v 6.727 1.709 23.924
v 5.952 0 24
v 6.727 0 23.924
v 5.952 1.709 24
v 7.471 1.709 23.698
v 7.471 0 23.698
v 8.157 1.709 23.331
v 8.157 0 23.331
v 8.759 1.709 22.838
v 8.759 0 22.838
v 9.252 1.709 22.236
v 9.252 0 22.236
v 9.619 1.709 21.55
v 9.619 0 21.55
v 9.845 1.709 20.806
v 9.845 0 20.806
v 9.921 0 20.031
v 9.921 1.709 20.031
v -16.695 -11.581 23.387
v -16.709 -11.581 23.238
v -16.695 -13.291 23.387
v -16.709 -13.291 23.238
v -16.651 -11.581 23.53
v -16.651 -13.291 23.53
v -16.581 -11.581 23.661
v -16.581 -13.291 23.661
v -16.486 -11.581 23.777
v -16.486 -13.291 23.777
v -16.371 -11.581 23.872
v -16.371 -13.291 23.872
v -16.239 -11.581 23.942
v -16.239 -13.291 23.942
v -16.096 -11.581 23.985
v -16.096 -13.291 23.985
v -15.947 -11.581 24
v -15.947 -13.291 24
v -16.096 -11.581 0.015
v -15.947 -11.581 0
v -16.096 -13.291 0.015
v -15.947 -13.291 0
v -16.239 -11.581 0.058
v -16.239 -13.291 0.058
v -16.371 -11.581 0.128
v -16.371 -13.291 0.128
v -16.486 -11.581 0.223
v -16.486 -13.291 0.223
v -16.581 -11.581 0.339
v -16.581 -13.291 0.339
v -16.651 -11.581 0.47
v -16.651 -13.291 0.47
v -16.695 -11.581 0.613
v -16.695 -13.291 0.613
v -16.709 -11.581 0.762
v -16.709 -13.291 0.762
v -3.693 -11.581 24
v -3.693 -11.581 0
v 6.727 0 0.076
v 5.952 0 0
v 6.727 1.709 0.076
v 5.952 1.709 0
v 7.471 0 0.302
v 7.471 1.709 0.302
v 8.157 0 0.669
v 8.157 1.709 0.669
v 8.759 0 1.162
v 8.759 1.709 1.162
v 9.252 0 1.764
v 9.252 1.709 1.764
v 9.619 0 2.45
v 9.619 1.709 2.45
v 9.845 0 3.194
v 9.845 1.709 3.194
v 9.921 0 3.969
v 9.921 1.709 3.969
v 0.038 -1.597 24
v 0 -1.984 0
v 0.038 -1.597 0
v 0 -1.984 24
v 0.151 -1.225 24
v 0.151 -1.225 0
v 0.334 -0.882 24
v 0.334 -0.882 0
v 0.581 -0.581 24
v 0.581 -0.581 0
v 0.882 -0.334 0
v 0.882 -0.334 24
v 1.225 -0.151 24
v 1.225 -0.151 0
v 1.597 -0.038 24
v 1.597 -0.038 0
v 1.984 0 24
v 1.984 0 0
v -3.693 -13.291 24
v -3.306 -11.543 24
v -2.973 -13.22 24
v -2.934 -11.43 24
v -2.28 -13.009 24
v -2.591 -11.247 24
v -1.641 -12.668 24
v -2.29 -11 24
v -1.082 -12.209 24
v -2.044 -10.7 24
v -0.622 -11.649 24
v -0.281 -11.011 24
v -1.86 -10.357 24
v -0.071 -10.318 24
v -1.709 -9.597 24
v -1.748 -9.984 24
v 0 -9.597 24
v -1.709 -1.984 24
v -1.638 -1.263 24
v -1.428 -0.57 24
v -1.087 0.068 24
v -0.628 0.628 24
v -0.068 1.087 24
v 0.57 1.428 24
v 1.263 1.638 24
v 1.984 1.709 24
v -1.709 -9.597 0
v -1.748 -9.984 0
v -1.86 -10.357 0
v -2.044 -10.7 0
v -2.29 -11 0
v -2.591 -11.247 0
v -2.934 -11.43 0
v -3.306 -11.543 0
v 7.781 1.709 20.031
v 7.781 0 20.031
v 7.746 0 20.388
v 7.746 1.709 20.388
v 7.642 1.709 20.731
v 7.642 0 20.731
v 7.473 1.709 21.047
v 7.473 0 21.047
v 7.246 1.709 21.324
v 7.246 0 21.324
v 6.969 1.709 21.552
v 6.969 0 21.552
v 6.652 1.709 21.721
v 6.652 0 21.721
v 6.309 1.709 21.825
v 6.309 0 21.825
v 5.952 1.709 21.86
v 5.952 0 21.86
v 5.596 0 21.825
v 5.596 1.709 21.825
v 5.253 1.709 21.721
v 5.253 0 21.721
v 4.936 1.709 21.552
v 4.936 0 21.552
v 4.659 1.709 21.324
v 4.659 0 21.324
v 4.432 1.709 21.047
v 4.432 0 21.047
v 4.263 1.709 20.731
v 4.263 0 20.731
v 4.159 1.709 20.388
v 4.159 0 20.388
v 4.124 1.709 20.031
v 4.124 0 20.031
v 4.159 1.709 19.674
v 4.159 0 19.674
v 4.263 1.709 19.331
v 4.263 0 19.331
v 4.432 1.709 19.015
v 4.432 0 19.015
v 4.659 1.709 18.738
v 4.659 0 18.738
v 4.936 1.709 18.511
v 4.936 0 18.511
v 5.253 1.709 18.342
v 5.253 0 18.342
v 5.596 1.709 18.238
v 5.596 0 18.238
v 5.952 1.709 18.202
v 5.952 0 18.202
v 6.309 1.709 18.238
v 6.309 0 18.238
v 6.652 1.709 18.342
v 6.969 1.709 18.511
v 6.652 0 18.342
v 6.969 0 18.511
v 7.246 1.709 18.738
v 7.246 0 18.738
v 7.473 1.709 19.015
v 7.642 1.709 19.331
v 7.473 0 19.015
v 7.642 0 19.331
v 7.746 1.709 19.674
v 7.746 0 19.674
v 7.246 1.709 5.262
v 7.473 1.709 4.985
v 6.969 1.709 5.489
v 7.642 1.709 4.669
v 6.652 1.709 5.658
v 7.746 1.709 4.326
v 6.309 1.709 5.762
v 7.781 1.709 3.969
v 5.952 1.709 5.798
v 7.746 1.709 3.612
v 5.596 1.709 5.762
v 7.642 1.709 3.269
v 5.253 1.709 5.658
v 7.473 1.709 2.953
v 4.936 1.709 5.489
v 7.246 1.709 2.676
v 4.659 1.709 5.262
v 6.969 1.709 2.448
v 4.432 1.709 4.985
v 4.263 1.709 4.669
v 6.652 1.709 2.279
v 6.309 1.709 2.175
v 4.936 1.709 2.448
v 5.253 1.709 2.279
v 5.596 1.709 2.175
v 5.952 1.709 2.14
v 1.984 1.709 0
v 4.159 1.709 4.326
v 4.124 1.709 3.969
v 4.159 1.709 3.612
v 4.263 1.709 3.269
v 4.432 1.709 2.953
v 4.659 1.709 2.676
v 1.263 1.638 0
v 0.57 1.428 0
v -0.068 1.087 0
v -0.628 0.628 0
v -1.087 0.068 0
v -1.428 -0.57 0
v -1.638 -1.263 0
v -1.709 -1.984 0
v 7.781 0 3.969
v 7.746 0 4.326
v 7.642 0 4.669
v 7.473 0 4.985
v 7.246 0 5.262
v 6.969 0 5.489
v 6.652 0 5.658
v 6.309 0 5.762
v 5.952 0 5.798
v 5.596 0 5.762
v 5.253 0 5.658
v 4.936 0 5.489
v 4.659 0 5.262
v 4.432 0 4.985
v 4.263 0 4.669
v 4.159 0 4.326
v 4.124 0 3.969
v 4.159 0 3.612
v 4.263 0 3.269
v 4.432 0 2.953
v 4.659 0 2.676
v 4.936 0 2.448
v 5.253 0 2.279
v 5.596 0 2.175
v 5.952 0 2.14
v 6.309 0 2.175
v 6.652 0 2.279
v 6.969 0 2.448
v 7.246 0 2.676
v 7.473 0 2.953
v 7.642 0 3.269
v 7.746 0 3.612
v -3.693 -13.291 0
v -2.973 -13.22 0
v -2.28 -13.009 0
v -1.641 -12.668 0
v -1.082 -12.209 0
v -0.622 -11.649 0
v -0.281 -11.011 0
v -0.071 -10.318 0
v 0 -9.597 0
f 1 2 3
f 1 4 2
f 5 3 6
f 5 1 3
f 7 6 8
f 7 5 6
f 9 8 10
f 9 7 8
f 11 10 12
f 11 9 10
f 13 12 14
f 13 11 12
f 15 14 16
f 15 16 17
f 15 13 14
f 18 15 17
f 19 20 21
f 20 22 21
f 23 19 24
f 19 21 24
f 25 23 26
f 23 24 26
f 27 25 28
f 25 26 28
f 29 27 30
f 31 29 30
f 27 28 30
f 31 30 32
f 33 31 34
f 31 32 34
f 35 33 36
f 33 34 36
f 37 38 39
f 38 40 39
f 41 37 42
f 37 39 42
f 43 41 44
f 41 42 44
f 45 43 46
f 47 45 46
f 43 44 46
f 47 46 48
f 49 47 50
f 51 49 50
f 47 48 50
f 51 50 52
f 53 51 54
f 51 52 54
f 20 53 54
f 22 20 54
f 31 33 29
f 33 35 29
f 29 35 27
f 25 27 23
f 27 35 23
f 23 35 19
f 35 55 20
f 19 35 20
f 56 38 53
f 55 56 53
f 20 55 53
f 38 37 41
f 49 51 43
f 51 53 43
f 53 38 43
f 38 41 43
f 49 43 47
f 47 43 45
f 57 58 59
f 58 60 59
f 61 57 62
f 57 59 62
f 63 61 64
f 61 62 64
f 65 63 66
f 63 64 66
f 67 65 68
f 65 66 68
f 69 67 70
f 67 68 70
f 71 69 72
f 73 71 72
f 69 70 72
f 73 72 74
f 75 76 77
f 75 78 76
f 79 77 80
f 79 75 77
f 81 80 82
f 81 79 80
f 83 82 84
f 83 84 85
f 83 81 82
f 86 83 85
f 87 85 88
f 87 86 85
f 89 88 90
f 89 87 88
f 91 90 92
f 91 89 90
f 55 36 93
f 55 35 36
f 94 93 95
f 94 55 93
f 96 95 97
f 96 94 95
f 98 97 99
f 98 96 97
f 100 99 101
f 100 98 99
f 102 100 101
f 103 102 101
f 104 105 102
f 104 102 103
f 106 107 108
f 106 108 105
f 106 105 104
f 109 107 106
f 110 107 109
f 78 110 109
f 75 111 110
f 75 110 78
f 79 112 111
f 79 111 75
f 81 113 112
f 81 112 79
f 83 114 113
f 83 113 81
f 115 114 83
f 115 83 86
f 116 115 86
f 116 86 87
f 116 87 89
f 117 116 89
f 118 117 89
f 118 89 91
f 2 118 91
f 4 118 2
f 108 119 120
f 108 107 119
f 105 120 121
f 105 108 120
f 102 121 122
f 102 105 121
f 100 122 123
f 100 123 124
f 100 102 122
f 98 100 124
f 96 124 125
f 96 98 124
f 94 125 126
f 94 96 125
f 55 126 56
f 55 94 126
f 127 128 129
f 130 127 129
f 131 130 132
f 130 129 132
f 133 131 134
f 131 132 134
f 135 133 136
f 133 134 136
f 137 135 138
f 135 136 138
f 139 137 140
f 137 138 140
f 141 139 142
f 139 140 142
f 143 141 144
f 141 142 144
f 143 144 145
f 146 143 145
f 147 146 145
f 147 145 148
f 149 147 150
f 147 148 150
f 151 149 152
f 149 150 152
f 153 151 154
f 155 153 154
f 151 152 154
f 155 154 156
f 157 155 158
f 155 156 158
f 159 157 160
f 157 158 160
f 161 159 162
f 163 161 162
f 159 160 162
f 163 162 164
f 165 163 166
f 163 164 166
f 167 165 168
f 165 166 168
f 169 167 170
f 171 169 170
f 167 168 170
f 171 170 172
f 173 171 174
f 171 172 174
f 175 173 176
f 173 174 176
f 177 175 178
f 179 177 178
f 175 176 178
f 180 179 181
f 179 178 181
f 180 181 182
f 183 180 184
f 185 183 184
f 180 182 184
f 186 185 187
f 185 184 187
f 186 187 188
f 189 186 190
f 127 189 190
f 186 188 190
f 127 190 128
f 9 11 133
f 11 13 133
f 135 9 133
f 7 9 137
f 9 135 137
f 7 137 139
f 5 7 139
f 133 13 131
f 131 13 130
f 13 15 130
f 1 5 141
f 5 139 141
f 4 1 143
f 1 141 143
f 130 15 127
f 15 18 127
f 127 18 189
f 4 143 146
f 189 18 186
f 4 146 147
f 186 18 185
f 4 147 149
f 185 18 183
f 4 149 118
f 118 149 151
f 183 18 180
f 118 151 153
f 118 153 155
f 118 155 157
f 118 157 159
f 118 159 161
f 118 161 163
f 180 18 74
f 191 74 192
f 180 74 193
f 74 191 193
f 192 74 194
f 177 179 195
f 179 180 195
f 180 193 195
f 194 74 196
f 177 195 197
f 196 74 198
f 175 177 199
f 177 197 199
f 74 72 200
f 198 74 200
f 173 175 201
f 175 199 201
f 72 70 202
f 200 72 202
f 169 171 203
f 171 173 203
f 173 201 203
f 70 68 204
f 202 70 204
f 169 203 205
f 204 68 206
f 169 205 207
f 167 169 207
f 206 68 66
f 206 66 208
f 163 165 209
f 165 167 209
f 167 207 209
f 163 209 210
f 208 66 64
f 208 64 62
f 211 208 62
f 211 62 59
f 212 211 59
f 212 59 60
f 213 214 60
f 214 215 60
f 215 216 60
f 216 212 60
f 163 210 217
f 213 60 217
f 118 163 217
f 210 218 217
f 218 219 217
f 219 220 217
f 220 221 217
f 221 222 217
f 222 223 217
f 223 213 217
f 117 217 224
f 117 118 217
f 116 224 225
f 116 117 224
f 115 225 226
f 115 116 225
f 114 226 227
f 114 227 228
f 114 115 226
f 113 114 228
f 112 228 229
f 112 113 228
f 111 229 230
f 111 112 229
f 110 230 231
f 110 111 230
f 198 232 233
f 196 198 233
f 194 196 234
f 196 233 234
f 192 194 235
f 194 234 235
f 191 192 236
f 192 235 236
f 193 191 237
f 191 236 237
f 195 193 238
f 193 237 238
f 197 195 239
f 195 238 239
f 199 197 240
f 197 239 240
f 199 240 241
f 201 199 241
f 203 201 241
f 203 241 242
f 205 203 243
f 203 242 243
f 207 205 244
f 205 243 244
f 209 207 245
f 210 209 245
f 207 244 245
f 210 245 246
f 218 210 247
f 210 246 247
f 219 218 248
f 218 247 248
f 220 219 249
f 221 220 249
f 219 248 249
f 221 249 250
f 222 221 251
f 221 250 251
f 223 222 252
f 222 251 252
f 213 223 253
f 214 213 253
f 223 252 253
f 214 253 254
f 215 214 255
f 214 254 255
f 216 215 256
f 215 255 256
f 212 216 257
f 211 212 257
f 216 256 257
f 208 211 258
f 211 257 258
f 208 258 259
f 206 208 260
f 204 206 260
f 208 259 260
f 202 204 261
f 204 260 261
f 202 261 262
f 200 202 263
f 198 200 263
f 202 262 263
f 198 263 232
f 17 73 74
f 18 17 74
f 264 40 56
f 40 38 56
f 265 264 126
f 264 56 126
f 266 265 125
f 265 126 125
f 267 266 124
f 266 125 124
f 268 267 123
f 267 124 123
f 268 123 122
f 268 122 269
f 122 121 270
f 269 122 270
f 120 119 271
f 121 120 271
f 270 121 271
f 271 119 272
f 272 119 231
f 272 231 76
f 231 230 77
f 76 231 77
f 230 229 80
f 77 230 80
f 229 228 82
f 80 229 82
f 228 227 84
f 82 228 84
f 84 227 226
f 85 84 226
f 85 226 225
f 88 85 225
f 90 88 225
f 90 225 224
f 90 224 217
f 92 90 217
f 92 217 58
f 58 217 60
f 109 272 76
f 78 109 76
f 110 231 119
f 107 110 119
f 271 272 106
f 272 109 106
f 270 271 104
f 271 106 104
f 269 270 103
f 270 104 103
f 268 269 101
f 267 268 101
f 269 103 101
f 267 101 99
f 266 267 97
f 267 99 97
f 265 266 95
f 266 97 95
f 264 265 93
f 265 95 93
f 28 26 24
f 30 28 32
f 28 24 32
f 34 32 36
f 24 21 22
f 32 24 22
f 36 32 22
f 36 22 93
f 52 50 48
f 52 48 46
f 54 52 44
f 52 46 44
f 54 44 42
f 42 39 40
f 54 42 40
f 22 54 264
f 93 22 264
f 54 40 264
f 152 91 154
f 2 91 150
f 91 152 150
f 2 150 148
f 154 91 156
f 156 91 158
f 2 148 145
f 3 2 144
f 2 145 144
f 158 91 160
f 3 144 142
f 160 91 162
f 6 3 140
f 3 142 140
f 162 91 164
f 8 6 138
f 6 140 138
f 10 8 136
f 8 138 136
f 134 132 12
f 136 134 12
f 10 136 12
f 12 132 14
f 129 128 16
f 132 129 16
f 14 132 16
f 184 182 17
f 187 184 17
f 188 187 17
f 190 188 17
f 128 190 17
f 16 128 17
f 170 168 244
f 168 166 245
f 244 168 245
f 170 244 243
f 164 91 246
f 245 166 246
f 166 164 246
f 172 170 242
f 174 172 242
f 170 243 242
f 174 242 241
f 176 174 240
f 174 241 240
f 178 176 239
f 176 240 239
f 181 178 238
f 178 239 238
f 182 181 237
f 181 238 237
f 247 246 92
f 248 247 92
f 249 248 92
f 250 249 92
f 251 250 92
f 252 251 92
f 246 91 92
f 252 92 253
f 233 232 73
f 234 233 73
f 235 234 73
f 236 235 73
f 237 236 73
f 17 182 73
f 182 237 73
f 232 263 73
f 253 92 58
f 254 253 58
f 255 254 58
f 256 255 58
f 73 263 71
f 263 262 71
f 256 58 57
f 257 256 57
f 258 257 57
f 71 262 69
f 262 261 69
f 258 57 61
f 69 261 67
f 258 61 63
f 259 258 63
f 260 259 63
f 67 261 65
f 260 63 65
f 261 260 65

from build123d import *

# Parameters (mm, degrees)
F1_DEPTH = 24
F2_R     = 1.98374
F3_R     = 3.69316
F4_R     = 3.96875
F5_R     = 0.762
F6_R     = 1.8288
F7_DEPTH = 1.70942


with BuildPart() as f1:
    # F0 (on Top) → F1 (new body)
    with BuildSketch(Plane.XY):
        Polygon((0, -13.29058), (0, 0), (9.92124, 0), (9.92124, 1.70942), (-1.70942, 1.70942), (-1.70942, -11.58116), (-16.70942, -11.58116), (-16.70942, -13.29058), align=None)
    extrude(amount=F1_DEPTH)

    # F2
    f2_edges = [f1.edges().sort_by_distance(p)[0] for p in [
        (0, 0, 12),
        (-1.70942, -11.58116, 12),
    ]]
    fillet(f2_edges, radius=F2_R)

    # F3
    f3_edges = [f1.edges().sort_by_distance(p)[0] for p in [
        (0, -13.29058, 12),
        (-1.70942, 1.70942, 12),
    ]]
    fillet(f3_edges, radius=F3_R)

    # F4
    f4_edges = [f1.edges().sort_by_distance(p)[0] for p in [
        (9.92124, 0.85471, 24),
        (9.92124, 0.85471, 0),
    ]]
    fillet(f4_edges, radius=F4_R)

    # F5
    f5_edges = [f1.edges().sort_by_distance(p)[0] for p in [
        (-16.70942, -12.43587, 0),
        (-16.70942, -12.43587, 24),
    ]]
    fillet(f5_edges, radius=F5_R)

    # F6 (on face) → F7 (cut, through all)
    with BuildSketch(Plane.XZ):
        with Locations((5.95249, 20.03125)):
            Circle(F6_R)
        with Locations((5.95249, 3.96875)):
            Circle(F6_R)
    extrude(amount=-F7_DEPTH, mode=Mode.SUBTRACT)


solid = f1.part
